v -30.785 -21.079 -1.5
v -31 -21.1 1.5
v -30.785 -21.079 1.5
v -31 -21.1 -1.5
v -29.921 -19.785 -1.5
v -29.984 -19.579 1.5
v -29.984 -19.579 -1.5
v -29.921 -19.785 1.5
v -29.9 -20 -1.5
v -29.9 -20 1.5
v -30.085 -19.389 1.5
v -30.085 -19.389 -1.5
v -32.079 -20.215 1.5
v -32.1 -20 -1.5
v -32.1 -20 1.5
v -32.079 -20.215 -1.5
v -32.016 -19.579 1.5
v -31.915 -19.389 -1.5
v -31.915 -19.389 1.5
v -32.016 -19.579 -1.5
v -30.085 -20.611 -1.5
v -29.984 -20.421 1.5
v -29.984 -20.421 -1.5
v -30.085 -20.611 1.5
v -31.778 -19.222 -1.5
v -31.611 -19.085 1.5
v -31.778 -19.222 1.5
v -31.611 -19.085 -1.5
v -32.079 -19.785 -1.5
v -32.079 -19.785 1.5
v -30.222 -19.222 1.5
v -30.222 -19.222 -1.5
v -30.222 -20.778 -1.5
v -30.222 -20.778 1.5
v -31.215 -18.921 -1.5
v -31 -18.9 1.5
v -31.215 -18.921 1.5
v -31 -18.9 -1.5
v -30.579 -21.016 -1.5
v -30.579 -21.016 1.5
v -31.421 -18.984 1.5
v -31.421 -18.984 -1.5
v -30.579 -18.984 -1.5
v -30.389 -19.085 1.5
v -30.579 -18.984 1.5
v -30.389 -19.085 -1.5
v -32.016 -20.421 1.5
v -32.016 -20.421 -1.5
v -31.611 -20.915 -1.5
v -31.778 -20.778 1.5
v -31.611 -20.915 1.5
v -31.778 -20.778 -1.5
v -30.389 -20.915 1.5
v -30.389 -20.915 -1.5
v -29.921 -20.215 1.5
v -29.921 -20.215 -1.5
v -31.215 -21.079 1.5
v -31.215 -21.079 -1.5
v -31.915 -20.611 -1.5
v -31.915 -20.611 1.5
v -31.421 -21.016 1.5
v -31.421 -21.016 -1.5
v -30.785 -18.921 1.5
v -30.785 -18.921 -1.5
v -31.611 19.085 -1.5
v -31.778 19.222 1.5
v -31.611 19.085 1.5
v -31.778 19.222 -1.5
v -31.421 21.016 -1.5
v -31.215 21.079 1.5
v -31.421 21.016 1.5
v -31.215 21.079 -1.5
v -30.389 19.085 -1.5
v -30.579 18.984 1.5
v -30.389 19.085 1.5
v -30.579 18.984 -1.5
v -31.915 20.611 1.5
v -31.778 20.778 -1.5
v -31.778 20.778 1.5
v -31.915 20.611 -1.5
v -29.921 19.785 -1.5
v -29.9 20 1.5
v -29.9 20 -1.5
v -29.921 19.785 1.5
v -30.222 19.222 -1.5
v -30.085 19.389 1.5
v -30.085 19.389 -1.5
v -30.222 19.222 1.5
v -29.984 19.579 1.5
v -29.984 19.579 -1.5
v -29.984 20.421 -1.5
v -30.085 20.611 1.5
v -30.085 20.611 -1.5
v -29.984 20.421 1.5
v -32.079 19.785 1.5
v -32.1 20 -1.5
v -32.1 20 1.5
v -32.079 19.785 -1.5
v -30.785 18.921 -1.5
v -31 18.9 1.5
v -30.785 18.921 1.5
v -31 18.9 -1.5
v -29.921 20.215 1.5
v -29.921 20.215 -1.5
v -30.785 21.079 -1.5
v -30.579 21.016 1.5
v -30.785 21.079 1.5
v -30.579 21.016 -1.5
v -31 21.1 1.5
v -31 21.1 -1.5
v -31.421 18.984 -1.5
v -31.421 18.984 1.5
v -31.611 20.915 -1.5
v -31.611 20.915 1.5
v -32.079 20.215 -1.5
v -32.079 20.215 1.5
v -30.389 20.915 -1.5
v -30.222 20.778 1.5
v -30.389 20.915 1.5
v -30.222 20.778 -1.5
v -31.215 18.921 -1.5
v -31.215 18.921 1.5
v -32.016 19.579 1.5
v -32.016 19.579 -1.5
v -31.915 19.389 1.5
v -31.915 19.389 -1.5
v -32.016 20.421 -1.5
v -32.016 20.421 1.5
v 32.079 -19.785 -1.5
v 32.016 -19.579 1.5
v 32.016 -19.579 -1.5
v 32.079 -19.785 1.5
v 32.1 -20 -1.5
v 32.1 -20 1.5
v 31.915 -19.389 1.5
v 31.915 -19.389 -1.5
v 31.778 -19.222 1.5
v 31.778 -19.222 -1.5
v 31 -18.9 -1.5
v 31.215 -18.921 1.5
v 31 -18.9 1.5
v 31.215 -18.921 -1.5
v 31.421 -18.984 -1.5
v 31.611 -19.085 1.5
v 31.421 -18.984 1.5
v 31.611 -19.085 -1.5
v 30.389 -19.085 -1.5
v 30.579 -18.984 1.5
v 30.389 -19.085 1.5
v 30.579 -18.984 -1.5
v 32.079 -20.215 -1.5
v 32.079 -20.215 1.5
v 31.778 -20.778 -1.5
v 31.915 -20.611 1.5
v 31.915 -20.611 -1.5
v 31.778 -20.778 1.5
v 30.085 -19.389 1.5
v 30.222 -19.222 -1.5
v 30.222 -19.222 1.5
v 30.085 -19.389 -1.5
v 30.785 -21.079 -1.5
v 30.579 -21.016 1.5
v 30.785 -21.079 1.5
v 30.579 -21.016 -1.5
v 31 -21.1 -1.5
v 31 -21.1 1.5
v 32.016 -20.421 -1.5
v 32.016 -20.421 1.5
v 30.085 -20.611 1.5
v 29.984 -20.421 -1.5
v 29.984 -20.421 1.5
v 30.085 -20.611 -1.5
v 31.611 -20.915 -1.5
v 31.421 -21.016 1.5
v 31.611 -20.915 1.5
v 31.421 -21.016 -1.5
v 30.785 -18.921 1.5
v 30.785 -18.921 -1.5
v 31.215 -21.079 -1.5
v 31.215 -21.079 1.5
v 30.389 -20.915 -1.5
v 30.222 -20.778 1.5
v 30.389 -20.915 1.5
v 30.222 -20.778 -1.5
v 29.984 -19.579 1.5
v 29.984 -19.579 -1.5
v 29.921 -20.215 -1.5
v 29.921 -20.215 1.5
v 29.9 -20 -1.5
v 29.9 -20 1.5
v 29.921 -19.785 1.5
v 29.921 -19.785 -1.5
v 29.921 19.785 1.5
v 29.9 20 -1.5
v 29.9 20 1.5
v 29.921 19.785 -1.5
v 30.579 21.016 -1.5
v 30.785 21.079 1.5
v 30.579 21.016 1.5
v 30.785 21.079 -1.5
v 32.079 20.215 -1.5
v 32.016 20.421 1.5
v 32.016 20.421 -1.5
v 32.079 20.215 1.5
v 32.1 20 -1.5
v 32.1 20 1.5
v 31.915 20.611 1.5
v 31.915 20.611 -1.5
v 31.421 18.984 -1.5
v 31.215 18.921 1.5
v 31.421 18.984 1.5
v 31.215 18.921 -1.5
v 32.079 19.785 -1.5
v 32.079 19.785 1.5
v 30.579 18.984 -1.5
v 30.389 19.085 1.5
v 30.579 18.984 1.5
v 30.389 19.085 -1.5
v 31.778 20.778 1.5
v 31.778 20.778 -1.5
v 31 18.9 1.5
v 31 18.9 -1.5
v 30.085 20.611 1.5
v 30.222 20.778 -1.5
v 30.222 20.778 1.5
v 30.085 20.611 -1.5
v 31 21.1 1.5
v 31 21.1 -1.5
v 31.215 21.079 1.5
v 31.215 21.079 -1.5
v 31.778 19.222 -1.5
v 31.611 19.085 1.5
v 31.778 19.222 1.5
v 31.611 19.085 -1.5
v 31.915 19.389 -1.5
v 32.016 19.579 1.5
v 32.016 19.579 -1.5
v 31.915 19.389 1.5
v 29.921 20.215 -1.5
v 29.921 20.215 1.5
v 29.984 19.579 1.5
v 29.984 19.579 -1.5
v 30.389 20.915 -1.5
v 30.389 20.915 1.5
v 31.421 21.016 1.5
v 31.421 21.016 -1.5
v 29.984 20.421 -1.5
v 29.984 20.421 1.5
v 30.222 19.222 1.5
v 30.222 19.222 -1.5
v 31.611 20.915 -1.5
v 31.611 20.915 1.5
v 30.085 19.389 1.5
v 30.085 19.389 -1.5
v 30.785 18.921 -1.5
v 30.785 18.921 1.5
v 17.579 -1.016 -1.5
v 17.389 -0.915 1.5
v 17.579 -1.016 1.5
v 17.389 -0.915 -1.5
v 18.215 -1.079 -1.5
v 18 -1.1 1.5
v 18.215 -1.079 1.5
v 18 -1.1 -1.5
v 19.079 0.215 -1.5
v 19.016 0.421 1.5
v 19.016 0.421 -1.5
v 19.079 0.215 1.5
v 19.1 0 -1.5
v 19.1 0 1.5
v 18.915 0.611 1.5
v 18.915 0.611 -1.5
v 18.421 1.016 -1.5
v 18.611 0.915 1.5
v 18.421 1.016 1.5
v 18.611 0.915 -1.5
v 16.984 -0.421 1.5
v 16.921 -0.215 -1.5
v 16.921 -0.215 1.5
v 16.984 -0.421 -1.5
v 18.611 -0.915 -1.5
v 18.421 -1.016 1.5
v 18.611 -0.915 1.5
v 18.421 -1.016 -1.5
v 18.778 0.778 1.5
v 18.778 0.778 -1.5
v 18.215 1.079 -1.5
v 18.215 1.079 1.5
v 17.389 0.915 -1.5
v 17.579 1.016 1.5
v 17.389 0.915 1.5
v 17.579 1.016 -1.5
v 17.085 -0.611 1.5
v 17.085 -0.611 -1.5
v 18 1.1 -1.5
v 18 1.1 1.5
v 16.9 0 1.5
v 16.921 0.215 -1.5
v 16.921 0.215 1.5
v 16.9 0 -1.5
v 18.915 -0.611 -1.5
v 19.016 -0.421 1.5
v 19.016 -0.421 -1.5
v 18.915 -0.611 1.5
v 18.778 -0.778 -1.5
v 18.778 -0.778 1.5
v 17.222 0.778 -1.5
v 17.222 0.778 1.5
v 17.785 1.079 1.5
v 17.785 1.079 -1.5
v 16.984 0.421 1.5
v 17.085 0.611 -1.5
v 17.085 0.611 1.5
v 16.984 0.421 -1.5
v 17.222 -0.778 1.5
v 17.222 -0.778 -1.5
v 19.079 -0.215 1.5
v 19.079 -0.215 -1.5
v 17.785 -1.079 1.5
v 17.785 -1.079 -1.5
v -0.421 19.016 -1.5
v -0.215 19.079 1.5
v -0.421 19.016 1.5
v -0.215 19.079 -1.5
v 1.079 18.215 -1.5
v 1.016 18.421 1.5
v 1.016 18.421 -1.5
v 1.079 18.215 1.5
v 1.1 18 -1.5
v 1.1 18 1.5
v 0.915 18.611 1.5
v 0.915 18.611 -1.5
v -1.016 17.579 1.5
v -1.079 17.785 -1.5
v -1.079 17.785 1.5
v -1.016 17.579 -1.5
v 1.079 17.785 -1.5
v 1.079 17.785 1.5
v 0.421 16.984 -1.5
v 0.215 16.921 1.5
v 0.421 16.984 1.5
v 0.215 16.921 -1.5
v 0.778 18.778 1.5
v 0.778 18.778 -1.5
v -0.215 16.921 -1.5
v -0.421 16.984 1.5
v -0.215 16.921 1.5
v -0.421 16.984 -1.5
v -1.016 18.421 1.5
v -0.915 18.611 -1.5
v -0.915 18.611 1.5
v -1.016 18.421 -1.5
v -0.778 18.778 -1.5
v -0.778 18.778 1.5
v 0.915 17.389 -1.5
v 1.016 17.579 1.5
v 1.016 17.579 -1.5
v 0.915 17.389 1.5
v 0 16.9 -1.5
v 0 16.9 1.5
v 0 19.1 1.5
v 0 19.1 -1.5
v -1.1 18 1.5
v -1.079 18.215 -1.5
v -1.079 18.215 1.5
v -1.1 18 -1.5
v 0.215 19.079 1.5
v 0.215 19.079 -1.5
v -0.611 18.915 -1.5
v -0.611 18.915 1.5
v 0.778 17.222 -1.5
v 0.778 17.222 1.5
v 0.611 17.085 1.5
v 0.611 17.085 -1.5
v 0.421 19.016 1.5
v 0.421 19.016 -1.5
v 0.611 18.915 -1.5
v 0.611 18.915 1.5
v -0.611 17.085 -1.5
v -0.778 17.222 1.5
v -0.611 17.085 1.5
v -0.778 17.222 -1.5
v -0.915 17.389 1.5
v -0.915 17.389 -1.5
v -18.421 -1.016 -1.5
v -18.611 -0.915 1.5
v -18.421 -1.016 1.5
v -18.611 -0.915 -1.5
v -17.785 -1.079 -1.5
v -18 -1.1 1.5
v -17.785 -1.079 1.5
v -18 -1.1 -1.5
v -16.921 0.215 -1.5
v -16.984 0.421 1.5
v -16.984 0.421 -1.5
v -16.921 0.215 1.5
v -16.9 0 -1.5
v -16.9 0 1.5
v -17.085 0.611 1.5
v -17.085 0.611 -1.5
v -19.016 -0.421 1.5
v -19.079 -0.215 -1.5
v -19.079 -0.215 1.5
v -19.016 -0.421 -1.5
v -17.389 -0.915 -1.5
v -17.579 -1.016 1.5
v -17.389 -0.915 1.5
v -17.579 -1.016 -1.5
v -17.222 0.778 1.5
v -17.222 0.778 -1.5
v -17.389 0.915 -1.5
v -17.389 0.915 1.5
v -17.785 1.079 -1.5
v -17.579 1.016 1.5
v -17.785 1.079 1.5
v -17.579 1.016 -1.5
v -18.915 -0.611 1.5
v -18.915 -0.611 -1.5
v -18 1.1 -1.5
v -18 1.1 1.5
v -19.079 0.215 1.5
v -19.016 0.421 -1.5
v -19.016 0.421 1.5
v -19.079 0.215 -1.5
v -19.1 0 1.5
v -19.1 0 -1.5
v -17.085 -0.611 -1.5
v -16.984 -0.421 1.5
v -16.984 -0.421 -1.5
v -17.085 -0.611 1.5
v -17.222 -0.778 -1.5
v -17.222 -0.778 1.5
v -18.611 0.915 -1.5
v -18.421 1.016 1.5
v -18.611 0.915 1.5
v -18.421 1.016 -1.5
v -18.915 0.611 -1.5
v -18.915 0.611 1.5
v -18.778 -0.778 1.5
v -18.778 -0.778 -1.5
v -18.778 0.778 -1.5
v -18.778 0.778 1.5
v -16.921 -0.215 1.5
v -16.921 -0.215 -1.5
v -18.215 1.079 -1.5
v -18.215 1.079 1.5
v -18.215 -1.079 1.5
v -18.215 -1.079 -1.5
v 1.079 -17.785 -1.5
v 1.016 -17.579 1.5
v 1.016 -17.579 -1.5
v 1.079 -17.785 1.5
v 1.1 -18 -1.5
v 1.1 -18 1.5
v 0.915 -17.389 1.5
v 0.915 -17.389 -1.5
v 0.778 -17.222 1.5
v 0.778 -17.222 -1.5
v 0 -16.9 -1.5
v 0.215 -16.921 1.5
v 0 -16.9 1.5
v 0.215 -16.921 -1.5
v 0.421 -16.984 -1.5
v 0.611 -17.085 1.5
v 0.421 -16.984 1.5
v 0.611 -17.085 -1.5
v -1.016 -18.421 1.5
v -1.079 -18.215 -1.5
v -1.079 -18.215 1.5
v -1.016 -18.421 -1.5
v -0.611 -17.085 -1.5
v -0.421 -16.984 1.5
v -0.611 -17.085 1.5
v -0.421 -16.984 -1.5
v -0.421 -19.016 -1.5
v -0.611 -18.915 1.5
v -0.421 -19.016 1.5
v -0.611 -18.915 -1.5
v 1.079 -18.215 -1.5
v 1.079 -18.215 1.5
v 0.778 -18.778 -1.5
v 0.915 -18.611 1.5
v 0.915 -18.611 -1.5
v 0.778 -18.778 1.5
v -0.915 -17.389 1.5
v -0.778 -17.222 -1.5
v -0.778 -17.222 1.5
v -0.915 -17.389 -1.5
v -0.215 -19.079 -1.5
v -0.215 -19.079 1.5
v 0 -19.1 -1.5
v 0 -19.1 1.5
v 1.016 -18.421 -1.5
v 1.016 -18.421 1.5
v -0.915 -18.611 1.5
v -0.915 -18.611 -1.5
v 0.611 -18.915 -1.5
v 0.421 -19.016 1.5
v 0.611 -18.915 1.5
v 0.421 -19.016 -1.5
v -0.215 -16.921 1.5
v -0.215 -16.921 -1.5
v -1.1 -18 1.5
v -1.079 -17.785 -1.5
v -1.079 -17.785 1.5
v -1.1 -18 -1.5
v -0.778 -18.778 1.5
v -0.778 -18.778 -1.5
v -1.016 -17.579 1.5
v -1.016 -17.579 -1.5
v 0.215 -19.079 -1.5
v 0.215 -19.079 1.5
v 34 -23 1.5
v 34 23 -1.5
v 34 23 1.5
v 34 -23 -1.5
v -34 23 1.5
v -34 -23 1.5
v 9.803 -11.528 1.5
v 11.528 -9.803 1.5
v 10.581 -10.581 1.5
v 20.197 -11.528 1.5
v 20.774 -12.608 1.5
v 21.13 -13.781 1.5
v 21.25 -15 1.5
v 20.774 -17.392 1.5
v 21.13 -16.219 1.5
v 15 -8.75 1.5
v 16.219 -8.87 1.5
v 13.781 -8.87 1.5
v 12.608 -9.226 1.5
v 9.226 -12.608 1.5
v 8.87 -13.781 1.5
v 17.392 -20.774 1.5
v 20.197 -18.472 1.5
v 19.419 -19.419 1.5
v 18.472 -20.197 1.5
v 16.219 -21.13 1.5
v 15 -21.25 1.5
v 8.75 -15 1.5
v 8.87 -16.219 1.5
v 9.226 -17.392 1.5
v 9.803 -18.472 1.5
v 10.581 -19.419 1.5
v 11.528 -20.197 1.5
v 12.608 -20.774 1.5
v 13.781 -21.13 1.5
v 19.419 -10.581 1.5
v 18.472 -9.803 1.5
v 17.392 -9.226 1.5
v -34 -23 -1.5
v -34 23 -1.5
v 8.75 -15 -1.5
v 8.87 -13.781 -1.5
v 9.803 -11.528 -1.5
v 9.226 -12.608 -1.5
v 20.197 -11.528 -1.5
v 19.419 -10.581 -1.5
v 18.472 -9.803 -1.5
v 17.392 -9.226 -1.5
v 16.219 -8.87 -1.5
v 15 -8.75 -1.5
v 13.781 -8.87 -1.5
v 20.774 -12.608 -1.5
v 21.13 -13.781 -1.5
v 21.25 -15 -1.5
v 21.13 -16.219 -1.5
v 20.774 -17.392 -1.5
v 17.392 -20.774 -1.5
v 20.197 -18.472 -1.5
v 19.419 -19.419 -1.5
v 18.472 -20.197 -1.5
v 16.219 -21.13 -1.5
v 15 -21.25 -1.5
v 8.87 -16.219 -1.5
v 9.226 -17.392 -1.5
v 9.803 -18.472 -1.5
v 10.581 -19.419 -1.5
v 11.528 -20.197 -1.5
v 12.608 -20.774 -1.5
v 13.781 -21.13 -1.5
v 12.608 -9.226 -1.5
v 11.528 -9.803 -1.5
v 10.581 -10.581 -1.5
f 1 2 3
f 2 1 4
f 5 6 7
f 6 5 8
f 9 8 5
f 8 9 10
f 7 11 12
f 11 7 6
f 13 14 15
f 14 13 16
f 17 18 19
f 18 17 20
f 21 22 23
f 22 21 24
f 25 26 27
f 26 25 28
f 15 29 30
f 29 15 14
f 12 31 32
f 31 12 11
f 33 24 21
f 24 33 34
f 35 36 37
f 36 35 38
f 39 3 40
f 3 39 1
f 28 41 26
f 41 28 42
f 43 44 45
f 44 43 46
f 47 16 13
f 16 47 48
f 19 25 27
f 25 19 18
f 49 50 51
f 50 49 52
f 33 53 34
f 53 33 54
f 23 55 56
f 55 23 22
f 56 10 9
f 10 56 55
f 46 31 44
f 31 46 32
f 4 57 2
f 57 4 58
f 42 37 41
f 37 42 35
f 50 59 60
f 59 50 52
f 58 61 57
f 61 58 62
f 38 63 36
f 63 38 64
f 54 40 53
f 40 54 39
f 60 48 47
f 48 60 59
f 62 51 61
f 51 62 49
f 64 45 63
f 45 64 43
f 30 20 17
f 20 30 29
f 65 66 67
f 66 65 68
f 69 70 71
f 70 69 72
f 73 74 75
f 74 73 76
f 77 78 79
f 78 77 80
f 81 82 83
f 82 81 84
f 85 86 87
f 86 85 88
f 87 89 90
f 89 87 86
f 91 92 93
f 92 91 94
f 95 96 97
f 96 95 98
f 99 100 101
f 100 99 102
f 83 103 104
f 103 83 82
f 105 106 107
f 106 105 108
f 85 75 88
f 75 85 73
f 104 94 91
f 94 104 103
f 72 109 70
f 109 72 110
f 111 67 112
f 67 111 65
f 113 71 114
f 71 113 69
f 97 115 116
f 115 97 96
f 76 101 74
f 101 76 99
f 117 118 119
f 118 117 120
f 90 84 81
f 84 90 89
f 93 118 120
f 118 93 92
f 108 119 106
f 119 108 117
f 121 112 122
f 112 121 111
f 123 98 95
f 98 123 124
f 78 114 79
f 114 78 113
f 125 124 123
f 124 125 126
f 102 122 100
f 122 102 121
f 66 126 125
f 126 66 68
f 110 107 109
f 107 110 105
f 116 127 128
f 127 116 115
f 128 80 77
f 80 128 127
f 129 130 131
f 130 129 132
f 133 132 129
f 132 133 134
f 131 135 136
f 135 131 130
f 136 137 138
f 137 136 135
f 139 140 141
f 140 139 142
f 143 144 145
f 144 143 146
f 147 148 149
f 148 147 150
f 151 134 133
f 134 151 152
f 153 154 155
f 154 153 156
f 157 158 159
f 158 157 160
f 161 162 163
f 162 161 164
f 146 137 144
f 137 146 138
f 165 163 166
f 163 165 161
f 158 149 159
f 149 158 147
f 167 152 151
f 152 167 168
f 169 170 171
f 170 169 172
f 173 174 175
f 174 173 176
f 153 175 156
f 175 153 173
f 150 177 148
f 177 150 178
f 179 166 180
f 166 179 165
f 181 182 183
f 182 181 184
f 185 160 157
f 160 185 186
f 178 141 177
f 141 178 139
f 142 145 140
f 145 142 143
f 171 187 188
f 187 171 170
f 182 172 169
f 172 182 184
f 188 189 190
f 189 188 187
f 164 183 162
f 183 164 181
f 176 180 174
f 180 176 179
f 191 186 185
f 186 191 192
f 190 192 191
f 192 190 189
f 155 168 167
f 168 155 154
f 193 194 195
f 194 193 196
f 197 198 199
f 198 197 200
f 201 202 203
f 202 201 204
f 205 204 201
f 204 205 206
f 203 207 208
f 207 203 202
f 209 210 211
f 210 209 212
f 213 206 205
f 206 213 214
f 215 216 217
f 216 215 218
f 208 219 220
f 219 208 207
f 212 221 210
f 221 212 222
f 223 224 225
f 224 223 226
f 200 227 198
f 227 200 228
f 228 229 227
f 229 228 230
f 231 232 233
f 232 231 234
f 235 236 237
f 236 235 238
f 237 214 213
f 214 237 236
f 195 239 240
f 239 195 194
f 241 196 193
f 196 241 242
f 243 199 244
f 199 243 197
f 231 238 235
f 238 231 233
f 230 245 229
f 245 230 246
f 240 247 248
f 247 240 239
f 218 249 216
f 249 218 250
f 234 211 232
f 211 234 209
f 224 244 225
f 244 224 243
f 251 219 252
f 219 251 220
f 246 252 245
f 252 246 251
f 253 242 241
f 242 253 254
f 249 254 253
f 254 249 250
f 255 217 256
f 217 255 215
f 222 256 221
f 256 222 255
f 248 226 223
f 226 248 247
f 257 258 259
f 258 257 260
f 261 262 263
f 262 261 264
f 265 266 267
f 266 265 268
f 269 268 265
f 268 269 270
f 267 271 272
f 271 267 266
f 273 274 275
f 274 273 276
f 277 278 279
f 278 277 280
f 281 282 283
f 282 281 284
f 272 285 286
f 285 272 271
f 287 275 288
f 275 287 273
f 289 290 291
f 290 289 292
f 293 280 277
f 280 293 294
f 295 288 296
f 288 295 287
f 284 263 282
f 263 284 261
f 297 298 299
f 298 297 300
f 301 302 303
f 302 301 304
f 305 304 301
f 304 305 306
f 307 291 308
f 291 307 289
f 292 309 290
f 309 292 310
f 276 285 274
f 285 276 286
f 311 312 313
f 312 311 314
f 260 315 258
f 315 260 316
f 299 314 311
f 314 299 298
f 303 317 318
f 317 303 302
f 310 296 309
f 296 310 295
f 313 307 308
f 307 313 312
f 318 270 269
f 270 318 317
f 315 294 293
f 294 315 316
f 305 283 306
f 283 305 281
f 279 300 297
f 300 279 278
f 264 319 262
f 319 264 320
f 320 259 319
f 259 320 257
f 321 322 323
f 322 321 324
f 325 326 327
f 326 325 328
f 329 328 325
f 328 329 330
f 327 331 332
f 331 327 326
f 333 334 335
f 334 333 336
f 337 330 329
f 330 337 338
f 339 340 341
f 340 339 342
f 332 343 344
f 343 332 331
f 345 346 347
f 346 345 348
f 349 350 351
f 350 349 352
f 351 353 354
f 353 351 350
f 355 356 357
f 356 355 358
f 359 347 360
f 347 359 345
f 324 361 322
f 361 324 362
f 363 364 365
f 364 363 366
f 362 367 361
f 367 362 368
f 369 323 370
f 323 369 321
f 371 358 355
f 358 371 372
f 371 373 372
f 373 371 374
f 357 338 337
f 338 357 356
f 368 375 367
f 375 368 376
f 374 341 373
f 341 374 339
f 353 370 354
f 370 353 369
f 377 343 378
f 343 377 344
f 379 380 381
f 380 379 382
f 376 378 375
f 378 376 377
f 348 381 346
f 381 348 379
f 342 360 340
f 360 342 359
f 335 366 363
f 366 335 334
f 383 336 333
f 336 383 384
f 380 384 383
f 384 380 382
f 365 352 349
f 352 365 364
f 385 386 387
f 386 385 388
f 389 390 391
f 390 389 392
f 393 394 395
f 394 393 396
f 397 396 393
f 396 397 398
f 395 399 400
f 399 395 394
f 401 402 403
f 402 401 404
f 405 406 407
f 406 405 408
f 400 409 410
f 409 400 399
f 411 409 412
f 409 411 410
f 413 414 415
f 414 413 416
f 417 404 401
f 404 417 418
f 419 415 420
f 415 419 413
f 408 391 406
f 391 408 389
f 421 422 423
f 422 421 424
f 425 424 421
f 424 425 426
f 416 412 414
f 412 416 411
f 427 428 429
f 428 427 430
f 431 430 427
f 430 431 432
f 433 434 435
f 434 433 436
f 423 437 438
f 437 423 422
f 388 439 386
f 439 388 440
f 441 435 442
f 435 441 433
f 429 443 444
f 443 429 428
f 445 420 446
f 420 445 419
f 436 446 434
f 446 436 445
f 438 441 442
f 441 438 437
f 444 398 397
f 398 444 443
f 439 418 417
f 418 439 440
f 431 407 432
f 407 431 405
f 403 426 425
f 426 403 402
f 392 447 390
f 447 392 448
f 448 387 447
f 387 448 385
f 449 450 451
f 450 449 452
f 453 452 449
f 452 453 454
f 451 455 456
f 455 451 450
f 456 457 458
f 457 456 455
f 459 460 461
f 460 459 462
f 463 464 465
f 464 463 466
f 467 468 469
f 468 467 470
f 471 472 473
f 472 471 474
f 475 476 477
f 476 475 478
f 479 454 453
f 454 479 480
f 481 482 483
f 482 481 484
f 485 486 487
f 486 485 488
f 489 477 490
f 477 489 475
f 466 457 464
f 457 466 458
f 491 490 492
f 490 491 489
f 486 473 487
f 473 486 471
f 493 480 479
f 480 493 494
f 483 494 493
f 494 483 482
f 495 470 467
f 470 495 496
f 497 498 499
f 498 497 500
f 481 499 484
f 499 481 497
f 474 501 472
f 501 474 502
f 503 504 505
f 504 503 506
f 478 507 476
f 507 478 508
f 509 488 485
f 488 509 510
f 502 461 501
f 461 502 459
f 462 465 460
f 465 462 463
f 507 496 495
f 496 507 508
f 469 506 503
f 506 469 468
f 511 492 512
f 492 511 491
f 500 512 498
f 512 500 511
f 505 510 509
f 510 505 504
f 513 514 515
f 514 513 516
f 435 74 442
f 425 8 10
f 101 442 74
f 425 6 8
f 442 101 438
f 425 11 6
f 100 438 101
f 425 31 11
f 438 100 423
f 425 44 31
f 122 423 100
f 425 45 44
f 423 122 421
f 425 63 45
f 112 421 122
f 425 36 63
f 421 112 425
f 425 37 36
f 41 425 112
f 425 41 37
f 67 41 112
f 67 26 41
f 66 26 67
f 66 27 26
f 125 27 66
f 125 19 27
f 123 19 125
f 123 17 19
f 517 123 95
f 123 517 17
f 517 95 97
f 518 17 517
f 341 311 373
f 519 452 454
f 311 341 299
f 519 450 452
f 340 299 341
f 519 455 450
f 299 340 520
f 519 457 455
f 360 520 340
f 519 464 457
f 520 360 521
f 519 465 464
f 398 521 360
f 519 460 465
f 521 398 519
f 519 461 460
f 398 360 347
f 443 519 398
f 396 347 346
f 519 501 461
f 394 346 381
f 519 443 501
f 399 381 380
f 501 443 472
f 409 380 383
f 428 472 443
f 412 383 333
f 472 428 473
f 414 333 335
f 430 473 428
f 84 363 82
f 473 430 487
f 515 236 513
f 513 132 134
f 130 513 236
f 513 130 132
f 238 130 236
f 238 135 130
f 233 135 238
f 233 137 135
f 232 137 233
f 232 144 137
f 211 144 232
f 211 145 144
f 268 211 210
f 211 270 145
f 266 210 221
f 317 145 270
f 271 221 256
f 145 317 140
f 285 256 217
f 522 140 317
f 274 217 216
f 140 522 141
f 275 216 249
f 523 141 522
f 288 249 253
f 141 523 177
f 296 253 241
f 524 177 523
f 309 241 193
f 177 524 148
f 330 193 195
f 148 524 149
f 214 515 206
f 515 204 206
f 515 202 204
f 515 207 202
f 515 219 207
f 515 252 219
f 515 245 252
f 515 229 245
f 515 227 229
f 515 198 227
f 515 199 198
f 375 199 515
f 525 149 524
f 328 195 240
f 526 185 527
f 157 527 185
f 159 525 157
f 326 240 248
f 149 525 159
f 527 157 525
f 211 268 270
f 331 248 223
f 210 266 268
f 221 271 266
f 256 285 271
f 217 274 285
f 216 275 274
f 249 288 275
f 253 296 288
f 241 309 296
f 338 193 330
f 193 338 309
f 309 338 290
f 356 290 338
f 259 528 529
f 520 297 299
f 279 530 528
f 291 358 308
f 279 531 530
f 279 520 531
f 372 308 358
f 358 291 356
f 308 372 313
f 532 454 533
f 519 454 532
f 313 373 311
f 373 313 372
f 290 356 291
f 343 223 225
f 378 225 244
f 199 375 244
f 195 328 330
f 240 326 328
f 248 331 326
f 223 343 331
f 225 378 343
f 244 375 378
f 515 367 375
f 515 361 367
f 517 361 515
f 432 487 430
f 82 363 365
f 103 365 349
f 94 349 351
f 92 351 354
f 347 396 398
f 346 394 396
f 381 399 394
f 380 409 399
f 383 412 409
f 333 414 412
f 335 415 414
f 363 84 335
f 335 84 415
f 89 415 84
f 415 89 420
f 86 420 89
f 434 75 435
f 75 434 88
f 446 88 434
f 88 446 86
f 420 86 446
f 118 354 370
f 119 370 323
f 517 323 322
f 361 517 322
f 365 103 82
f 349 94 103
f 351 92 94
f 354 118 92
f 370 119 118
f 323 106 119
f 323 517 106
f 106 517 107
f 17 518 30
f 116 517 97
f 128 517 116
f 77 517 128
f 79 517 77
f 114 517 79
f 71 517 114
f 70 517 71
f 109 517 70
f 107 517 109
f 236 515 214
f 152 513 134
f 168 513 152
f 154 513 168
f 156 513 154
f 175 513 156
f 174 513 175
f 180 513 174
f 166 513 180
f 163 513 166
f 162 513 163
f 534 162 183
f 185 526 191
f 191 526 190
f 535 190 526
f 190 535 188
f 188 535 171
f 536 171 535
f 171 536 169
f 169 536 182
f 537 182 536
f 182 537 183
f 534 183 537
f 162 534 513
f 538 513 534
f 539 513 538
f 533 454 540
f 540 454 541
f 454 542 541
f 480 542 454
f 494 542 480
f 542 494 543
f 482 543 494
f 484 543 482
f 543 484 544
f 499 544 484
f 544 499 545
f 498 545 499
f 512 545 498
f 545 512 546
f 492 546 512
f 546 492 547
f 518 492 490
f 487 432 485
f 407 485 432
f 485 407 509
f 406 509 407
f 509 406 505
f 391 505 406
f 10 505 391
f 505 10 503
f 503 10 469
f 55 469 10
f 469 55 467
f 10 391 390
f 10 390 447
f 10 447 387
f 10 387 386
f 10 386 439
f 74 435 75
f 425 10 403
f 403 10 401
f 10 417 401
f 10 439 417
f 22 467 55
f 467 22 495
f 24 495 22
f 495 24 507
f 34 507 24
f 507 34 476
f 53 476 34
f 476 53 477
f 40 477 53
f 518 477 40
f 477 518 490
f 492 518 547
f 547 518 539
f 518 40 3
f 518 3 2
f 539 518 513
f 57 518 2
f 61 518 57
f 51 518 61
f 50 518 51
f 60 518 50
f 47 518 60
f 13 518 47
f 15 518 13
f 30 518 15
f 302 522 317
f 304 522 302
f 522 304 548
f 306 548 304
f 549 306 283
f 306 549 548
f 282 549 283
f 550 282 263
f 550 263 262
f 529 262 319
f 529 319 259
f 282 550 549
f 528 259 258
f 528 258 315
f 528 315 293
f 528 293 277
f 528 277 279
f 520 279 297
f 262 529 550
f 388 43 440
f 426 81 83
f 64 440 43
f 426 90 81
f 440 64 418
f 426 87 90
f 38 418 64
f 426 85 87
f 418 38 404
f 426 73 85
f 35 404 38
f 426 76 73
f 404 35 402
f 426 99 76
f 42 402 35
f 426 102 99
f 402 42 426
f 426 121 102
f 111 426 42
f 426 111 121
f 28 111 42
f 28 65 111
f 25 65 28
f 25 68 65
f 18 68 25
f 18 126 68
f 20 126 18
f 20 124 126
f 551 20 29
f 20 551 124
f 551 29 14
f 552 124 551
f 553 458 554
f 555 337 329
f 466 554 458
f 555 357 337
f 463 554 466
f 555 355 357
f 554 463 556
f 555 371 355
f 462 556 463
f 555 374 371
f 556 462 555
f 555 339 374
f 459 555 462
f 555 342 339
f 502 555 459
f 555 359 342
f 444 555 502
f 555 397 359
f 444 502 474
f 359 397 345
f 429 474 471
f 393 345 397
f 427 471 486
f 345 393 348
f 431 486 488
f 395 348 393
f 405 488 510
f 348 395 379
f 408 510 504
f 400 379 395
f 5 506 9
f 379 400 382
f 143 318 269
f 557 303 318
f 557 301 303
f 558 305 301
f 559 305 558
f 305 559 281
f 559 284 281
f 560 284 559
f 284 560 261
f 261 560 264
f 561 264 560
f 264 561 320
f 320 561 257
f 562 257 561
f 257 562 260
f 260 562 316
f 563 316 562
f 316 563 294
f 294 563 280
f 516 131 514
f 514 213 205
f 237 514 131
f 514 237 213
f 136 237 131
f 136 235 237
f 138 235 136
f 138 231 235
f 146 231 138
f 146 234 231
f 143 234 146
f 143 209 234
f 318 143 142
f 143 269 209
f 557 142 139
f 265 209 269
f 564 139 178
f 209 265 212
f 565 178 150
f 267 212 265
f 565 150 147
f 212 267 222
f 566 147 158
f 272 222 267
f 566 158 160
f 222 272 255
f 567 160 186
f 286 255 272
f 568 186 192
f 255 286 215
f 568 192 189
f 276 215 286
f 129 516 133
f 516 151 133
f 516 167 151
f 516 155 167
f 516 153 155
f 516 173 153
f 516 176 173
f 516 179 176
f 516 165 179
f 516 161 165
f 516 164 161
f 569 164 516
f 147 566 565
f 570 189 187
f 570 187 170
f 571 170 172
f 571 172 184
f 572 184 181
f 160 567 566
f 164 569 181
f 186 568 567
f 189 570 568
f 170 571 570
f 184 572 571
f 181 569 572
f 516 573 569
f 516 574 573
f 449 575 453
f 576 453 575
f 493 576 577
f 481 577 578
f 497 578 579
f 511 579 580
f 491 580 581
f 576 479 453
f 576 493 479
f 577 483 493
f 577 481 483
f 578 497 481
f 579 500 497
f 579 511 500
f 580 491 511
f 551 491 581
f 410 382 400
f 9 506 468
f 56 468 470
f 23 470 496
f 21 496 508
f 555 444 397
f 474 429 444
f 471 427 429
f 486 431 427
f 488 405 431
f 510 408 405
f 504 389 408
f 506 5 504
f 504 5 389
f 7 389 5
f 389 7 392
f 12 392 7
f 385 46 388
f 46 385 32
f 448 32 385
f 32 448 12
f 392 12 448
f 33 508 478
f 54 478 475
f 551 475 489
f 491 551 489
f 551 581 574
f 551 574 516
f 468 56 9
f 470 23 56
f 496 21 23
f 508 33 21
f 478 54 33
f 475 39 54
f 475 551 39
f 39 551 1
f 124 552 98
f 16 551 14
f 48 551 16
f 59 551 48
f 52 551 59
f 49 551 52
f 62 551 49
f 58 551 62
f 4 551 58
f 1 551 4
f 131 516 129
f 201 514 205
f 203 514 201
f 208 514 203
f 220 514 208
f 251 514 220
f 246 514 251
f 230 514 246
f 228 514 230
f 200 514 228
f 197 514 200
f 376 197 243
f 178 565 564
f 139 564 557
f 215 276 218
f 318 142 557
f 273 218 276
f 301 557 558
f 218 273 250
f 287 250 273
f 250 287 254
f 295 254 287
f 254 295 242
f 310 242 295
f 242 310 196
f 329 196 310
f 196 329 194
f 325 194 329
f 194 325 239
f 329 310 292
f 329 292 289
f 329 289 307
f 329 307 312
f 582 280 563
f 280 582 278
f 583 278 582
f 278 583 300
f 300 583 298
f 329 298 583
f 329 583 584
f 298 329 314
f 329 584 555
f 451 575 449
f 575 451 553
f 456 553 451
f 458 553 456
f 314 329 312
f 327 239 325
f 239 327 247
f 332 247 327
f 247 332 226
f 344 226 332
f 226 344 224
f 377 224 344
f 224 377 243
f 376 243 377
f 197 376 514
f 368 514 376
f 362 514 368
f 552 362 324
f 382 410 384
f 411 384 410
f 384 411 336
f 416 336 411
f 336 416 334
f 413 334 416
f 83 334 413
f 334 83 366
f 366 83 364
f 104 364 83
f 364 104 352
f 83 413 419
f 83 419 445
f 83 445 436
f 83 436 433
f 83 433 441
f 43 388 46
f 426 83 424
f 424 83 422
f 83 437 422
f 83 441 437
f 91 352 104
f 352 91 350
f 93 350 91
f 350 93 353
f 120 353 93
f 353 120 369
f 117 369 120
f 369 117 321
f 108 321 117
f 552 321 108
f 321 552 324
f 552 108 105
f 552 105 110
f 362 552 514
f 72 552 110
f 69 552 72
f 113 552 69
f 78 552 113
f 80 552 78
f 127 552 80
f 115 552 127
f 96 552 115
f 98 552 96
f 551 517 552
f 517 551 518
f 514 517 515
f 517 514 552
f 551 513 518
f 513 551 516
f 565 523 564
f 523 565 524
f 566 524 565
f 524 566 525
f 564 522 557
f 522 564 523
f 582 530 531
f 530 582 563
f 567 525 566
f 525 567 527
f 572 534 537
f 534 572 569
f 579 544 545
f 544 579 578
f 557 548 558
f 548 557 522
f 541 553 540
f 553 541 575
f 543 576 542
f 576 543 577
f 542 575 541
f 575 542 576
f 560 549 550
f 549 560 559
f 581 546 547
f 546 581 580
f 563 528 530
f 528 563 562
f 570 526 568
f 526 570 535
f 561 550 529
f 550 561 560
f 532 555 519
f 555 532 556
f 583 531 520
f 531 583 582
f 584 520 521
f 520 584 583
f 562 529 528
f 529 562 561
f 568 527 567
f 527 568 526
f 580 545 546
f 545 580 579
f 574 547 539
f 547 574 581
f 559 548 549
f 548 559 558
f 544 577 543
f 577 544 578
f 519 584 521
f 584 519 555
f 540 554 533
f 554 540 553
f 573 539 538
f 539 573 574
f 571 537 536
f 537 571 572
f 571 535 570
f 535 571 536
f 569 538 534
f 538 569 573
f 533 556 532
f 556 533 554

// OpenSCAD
// file: params.scad
//////////////////////////////////////////////////////////////
// Meridian Presence Node — Shared Parameters
// Single source of truth. Both presence_node and lid files
// `include` this — edit values here, not in either file.
//////////////////////////////////////////////////////////////

// --- LD2410B module (35 x 7 x 7.4 mm) ---
ld_len   = 35;
ld_wid   = 7;
ld_thick = 7.4;

// --- Enclosure body ---
body_width  = 68;   // widened from 60 — see battery note below
body_depth  = 45;
body_height = 55;
wall        = 3.66;

// --- Sensor window (derived from LD2410B size) ---
window_width  = ld_len + 6;
window_height = ld_wid + 6;

// --- PVC saddle mount ---
bolt_circle_d = 36;
screw_hole_d  = 1.6;
clearance     = 0.6;

// --- Battery: actual 2000mAh unit measured at 56 x 34 x 11mm.
// The old 50 x 30 x 8 guess was too small in every dimension —
// 56mm length in particular exceeded the old interior width
// (55.2mm) outright, not just the bay's margin. body_width
// went 60 -> 68 to give this real clearance (63.2mm interior,
// ~1.6mm clear on each side of the battery with the bay's
// existing +4mm margin formula, instead of a razor-thin fit).
bat_len   = 56;
bat_wid   = 34;
bat_thick = 11;
// main file
//////////////////////////////////////////////////////////////
// Battery Access Hatch — bottom panel, v0.1
// Standalone file — print separately from the body and lid.
//
// Covers the 60x38mm opening cut into the body's bottom wall
// (see battery_hatch_opening() in presence_node_v0.15.scad).
// Held with 4 screws into the body's pilot holes, sealed with a
// flat strip of foam tape against the bottom face — same simple
// approach as the lid, after the recessed-channel lesson a few
// versions back.
//
// Two things pass through THIS panel's footprint that have
// nothing to do with the battery, both checked for clearance:
//  - All four saddle-mount bolts (radius 18mm pattern) — the
//    panel is large enough that the entire bolt circle sits
//    inside it, so it needs its own clearance holes too.
//  - The cable gland, relocated here from the body — its old
//    spot at (10,-5) fell inside the new hatch opening, so it
//    couldn't stay on the fixed wall.
//////////////////////////////////////////////////////////////
include <params.scad>

panel_x = 68;
panel_y = 46;
panel_thick = 3;

// Hatch's own attachment screws — must match
// battery_hatch_screw_holes() in the body file exactly.
screw_x = [-31, 31];
screw_y = [-20, 20];

// Saddle bolt pattern — must match saddle_bolts() in the body.
saddle_r = bolt_circle_d / 2;

// Cable gland, relocated off the fixed wall onto this panel.
// Checked clear of every screw hole and saddle bolt position by
// at least 10mm center-to-center.
gland_x = 15;
gland_y = -15;
gland_d = 12.5;

module battery_hatch() {
    difference() {
        cube([panel_x, panel_y, panel_thick], center = true);

        for (x = screw_x)
            for (y = screw_y)
                translate([x, y, 0])
                    cylinder(h = panel_thick + 2,
                             d = screw_hole_d + clearance,
                             $fn = 32, center = true);

        for (i = [0:3]) {
            angle = i*90;
            translate([saddle_r*cos(angle), saddle_r*sin(angle), 0])
                cylinder(h = panel_thick + 2,
                         d = screw_hole_d + clearance,
                         $fn = 32, center = true);
        }

        translate([gland_x, gland_y, 0])
            cylinder(h = panel_thick + 2, d = gland_d, $fn = 32, center = true);
    }
}

// Render — without this line, nothing prints.
battery_hatch();
